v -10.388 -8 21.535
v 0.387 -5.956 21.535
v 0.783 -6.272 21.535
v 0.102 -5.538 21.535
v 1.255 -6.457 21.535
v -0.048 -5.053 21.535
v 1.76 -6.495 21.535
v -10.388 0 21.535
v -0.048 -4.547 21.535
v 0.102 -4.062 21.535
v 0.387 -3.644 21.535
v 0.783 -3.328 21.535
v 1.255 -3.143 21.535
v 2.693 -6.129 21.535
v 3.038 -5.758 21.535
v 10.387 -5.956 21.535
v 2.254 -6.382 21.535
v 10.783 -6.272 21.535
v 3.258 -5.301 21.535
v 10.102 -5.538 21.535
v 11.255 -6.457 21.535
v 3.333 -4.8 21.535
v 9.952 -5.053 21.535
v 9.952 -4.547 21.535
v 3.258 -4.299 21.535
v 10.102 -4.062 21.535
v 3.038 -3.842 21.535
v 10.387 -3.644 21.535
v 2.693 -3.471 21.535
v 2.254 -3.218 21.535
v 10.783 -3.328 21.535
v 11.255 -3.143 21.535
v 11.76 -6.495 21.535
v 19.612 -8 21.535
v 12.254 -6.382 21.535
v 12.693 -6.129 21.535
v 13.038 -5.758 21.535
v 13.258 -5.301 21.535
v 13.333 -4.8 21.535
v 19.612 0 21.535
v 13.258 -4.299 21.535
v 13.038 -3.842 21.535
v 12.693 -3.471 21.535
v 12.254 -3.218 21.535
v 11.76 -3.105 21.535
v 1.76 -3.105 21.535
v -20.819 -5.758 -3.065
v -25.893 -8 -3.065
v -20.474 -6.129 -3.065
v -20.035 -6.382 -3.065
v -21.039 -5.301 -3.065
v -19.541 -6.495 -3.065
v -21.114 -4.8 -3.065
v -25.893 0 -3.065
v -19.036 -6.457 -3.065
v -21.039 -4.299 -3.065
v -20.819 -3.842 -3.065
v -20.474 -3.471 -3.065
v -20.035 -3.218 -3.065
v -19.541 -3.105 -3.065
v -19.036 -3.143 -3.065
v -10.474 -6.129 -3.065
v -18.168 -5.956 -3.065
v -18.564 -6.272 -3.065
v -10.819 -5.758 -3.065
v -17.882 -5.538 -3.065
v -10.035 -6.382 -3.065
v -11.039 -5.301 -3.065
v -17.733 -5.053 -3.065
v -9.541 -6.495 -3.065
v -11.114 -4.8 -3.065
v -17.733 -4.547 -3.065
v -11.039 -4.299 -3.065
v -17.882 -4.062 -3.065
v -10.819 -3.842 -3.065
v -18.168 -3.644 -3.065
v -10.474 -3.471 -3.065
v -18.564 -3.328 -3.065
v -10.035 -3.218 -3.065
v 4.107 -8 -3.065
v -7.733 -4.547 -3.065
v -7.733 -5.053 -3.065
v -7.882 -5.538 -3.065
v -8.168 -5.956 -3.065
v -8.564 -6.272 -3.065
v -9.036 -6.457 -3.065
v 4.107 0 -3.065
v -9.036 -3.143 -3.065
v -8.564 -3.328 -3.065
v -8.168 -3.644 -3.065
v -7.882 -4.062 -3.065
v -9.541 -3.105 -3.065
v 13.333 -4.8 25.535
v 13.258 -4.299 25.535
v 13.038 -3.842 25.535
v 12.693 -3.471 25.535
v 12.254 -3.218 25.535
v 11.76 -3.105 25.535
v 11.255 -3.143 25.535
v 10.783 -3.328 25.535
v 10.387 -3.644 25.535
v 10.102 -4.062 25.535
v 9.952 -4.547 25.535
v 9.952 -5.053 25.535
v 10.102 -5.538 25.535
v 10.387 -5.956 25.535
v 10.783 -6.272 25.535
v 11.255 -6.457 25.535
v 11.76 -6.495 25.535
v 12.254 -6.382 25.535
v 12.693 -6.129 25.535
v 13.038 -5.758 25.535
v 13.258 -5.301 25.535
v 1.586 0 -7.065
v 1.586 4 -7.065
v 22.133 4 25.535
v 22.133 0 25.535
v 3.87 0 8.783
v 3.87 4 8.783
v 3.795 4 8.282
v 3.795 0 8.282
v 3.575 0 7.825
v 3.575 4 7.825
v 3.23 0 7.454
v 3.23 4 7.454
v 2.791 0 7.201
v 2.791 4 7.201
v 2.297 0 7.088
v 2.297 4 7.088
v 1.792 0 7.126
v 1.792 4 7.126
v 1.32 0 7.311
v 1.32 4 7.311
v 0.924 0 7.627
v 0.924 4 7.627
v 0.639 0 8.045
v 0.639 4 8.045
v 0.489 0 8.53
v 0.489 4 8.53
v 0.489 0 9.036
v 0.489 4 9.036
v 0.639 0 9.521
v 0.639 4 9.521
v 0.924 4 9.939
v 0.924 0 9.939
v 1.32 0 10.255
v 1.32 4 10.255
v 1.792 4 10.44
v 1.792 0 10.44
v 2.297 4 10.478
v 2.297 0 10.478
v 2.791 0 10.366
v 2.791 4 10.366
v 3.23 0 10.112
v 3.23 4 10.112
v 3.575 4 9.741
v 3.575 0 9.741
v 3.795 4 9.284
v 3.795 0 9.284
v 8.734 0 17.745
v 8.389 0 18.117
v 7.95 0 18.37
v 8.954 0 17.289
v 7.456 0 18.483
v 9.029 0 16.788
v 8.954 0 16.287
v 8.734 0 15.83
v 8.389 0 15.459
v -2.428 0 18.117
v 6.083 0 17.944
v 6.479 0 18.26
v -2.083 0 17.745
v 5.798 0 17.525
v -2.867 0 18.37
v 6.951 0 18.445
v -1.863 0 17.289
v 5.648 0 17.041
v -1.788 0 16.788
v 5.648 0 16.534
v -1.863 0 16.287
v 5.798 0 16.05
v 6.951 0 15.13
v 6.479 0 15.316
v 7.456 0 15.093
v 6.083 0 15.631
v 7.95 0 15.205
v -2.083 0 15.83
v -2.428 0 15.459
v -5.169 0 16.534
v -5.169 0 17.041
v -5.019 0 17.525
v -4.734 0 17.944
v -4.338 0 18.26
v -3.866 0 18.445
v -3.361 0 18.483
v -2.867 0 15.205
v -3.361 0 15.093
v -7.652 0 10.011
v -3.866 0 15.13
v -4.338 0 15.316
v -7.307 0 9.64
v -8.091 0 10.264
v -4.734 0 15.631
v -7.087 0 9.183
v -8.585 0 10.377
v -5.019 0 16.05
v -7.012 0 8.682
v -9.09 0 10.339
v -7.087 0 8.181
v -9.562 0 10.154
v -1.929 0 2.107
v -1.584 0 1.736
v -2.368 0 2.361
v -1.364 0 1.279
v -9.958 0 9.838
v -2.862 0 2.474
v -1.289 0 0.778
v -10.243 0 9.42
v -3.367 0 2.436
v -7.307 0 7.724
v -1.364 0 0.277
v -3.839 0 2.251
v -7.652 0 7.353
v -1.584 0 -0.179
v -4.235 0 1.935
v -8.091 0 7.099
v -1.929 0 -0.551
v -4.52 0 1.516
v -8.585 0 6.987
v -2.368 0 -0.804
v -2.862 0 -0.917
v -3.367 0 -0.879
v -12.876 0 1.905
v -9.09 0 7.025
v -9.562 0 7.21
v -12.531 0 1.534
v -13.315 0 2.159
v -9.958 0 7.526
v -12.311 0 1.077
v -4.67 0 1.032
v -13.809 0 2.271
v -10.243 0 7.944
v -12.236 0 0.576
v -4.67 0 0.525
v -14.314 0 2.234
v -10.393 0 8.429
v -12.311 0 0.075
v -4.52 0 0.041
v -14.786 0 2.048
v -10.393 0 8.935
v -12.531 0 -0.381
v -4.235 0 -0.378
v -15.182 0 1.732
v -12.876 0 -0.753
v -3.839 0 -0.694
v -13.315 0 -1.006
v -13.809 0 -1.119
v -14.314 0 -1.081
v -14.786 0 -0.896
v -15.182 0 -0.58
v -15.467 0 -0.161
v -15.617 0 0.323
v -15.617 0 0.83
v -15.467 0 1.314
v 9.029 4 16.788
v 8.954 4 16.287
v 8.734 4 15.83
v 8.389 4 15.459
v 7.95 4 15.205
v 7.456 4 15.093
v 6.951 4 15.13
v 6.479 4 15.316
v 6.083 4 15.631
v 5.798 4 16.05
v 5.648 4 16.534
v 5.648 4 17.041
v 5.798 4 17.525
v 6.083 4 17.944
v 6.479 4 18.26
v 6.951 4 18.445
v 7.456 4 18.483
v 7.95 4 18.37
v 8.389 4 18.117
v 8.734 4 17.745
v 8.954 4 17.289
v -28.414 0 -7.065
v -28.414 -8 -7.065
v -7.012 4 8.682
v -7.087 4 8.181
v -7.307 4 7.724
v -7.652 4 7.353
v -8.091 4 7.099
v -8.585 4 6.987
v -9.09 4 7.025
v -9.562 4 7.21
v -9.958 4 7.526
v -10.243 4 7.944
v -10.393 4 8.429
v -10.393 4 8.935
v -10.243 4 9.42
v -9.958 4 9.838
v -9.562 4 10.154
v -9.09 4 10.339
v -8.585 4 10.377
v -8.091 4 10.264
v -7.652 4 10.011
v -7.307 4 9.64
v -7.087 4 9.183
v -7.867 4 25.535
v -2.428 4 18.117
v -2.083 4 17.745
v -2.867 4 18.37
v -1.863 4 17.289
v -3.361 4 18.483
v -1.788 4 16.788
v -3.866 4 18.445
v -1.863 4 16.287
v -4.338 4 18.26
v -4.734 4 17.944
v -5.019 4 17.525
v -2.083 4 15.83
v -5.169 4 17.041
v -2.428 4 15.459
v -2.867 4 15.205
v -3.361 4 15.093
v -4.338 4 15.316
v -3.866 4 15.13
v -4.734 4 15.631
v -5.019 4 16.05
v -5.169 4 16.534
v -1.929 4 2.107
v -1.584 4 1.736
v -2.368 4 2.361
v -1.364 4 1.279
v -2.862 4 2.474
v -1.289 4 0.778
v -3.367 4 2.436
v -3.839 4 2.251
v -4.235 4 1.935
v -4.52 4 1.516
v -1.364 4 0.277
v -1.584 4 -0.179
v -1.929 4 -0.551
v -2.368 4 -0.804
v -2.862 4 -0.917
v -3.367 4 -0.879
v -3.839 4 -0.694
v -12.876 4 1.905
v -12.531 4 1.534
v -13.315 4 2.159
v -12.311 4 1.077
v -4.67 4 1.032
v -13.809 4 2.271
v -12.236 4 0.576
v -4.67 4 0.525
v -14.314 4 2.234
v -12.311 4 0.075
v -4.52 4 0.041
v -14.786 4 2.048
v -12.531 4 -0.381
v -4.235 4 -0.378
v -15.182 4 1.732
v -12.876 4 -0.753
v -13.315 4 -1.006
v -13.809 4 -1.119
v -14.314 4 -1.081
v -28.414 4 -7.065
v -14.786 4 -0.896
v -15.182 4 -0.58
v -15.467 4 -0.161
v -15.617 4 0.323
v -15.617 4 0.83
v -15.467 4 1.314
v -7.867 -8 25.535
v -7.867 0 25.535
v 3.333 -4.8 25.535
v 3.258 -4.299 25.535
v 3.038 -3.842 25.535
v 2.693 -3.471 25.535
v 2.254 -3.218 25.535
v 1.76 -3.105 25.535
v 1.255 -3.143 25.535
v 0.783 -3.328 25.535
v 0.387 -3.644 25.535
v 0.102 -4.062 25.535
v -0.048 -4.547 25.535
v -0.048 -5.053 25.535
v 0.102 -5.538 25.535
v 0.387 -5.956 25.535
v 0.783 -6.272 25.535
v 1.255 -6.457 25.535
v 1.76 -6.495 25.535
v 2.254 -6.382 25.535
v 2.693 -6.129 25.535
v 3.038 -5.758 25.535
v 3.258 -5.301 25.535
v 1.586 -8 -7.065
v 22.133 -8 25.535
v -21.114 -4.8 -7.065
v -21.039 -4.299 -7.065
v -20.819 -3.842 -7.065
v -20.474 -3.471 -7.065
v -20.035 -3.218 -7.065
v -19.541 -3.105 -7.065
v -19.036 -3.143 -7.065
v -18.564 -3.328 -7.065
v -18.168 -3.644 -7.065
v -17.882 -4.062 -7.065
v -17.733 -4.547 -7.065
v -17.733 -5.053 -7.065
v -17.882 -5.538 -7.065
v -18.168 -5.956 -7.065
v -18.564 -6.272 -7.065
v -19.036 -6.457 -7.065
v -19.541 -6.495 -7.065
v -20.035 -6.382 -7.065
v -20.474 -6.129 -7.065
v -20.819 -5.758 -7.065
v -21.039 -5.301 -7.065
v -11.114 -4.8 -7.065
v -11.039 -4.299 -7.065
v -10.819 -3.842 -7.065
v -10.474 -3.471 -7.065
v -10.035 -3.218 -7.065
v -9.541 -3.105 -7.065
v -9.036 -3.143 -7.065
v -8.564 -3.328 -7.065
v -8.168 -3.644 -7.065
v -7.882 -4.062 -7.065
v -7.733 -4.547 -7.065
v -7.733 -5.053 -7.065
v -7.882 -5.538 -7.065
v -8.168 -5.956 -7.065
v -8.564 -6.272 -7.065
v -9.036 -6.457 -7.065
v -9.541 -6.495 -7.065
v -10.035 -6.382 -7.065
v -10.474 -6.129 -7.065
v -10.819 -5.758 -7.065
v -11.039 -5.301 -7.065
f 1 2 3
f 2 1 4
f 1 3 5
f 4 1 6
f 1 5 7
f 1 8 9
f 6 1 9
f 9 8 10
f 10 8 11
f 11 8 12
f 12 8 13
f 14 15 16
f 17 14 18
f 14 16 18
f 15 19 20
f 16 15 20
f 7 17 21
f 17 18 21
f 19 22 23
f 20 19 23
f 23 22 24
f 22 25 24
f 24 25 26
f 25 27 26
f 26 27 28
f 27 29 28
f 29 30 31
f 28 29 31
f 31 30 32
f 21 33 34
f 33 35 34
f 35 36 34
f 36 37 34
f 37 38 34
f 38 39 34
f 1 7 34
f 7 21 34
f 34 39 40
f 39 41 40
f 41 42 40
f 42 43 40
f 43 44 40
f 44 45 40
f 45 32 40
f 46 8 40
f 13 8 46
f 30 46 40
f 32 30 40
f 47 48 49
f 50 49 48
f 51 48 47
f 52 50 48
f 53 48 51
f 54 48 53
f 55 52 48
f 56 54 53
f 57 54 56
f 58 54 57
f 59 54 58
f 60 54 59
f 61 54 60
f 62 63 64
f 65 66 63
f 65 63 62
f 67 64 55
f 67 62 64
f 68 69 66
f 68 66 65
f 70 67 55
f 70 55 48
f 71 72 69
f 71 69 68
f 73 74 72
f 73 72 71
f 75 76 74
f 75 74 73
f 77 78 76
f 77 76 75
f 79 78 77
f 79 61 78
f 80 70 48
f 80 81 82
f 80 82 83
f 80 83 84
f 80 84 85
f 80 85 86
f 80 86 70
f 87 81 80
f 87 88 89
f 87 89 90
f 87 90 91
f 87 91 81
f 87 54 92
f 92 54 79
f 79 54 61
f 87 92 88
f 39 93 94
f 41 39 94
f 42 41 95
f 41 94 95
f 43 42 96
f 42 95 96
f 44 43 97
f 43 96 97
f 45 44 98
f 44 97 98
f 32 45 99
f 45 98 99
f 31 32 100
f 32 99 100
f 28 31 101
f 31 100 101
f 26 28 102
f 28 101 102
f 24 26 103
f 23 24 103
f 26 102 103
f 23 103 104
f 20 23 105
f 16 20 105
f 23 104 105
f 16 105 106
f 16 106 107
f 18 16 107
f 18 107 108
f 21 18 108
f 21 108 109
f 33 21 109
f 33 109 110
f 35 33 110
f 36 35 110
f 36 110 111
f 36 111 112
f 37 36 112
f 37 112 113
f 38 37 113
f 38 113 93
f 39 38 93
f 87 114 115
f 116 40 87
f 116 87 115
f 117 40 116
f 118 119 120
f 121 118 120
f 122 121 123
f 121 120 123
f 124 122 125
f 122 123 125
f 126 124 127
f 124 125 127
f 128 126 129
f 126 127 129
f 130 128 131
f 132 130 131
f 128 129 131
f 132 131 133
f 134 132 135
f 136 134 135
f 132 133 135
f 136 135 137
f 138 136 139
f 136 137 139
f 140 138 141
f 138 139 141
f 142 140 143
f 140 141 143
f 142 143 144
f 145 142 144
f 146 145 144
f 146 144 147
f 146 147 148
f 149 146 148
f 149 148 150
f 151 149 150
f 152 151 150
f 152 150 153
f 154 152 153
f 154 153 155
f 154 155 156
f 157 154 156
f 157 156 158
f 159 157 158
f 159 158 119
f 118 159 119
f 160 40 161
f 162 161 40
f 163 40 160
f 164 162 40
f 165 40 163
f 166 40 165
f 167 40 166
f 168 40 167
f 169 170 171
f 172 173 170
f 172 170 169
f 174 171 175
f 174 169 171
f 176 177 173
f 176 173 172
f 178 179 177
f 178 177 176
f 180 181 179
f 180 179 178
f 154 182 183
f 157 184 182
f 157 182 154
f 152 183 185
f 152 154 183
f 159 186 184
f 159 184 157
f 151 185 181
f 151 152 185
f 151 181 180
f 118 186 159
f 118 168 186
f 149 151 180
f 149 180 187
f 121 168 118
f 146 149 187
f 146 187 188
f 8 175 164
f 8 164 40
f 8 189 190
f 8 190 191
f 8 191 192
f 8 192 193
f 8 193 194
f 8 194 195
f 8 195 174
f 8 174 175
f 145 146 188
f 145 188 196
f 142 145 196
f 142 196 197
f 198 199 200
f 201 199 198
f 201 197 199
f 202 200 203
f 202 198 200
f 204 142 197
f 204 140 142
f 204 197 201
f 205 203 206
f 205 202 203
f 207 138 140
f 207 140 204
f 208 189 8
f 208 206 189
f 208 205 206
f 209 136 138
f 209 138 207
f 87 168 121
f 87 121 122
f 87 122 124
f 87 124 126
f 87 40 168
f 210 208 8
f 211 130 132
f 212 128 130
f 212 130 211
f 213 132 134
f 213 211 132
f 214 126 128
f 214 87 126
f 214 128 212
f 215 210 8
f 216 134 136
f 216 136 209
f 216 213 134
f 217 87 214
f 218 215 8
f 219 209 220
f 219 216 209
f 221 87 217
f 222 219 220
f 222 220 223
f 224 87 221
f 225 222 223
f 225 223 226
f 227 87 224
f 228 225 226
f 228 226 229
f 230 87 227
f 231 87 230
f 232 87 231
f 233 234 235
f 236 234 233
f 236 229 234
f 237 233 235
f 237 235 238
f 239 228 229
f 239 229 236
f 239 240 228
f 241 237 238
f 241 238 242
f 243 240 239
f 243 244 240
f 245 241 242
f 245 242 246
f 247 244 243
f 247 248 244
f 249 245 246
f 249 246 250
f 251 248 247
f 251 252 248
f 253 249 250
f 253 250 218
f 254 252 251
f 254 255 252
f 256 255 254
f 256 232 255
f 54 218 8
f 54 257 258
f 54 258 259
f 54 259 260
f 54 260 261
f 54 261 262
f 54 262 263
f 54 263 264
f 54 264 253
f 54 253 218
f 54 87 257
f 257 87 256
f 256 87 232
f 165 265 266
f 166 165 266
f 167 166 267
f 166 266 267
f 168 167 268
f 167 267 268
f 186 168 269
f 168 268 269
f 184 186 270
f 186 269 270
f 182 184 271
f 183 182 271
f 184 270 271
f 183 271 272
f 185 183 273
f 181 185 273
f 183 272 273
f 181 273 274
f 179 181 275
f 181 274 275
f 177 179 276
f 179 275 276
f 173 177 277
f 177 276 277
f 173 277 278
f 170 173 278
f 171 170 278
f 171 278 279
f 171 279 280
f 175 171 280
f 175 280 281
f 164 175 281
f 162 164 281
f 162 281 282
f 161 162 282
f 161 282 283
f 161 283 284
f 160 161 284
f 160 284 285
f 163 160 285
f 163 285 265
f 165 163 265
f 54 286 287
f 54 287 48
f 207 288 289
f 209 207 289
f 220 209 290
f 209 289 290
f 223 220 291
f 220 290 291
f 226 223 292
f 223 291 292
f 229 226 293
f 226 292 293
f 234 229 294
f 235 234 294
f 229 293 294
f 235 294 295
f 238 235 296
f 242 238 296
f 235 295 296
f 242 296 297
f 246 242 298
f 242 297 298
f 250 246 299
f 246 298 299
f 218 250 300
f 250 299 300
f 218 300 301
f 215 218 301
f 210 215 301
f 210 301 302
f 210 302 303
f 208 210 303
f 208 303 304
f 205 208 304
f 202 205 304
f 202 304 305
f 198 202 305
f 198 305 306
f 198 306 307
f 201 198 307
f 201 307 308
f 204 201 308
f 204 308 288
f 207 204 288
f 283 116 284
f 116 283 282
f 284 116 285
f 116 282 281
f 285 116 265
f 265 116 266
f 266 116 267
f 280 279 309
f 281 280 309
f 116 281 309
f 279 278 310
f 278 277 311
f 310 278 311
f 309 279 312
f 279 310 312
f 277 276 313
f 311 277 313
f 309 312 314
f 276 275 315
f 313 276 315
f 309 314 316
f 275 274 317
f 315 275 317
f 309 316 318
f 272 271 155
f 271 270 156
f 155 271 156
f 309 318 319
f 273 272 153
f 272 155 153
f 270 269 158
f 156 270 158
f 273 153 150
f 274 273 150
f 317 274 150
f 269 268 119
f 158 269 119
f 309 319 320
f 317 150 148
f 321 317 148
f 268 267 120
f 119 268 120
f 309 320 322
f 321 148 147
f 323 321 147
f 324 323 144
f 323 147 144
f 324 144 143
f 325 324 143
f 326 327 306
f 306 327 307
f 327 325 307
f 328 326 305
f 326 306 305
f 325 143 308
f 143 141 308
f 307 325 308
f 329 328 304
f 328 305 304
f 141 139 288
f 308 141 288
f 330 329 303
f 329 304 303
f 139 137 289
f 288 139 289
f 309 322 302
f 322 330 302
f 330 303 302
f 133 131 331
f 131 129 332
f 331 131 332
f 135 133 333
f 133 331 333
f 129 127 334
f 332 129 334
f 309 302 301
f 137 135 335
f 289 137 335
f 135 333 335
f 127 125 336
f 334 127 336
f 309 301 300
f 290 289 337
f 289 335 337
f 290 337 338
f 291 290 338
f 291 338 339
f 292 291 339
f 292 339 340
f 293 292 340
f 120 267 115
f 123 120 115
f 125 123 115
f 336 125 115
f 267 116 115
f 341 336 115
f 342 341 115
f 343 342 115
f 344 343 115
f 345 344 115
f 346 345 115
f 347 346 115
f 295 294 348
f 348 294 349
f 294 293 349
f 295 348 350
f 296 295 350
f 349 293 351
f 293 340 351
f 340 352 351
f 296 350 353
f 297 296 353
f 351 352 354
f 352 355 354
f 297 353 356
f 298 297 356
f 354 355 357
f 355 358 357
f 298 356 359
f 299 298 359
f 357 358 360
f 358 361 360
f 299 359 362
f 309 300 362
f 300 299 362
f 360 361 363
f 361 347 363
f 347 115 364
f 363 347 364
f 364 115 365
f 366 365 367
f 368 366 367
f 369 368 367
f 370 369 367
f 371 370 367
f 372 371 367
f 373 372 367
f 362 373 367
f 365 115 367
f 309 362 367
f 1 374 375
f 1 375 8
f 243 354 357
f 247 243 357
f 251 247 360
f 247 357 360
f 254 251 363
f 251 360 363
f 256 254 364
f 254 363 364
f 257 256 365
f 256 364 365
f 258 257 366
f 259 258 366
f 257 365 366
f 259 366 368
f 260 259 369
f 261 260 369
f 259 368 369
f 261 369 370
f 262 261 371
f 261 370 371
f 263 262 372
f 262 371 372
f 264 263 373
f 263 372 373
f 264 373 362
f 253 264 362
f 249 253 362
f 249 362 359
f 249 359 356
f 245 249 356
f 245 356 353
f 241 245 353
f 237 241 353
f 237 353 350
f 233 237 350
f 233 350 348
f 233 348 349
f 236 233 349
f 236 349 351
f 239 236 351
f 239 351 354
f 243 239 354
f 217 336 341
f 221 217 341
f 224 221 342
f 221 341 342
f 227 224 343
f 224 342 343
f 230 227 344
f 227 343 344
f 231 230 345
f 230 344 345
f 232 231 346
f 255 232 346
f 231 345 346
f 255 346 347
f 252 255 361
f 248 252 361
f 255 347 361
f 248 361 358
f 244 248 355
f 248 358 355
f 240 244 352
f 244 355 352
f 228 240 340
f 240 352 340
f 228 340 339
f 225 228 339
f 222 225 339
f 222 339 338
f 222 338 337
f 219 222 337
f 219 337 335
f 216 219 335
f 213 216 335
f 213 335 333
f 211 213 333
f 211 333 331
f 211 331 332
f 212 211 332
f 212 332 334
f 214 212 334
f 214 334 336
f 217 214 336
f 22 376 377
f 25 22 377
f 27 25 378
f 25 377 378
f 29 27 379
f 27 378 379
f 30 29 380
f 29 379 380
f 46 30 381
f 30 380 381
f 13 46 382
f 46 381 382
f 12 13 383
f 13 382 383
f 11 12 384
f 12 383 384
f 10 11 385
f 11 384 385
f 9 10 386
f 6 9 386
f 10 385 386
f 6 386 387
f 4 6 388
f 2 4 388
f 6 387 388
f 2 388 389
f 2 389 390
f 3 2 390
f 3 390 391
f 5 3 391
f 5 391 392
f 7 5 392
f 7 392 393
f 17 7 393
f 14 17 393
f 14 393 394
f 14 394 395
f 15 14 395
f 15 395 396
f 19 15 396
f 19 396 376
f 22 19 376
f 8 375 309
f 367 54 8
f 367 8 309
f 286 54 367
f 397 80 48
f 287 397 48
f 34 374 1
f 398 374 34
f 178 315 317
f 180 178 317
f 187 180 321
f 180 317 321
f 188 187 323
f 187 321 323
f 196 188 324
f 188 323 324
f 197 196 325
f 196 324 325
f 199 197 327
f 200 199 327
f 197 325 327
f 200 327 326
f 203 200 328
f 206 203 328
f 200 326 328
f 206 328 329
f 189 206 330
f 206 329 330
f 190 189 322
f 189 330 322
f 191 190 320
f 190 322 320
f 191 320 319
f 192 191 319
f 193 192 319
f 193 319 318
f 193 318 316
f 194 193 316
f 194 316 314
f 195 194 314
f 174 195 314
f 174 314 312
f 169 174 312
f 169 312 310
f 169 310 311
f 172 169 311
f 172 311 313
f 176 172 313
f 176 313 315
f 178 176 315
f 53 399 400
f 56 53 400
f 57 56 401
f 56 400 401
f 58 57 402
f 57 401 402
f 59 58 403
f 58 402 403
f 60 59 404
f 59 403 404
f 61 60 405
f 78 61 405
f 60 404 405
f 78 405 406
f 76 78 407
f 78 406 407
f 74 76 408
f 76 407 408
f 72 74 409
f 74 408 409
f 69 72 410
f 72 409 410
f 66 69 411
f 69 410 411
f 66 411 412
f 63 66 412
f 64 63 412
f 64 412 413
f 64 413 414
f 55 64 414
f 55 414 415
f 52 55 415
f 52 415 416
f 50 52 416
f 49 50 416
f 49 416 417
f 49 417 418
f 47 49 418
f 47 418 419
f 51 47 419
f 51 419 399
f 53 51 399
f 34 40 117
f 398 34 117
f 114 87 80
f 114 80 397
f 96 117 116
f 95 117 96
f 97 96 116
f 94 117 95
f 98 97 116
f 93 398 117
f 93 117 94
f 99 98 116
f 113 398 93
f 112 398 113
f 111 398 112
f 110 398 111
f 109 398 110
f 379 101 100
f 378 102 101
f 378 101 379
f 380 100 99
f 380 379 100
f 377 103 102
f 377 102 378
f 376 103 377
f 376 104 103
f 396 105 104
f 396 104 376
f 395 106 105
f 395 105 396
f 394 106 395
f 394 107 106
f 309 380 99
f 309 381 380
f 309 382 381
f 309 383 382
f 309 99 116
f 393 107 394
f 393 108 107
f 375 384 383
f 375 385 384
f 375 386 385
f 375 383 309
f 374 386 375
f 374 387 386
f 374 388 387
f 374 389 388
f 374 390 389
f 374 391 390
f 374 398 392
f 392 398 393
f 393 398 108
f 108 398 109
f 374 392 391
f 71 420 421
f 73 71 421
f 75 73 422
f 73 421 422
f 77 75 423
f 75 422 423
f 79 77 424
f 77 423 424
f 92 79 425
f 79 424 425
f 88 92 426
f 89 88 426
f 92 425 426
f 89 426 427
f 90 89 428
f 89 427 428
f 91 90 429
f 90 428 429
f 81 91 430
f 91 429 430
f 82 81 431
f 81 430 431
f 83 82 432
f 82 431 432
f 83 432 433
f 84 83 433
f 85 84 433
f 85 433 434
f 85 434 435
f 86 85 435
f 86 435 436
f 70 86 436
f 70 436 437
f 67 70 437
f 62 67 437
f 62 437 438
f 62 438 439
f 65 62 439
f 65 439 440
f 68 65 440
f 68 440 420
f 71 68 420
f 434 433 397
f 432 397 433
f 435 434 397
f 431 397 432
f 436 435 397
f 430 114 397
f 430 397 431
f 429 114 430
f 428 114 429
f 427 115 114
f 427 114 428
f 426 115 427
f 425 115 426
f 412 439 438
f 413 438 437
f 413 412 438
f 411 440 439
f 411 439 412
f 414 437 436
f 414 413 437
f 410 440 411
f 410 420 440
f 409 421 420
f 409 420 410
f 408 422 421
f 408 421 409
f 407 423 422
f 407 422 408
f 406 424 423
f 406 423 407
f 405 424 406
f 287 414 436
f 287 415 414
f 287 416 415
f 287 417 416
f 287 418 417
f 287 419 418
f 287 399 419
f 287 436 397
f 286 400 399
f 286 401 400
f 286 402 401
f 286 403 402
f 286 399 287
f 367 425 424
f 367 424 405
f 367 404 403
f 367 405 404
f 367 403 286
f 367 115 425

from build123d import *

# Parameters (mm, degrees)
ESTRUSIONE_ESTRUSIONE1_DEPTH = 4
ESTRUSIONE_ESTRUSIONE2_DEPTH = 8
SCHIZZO7_R                   = 1.7
TAGLIO_ESTRUSIONE4_DEPTH     = 13
SCHIZZO10_R                  = 1.7
TAGLIO_ESTRUSIONE5_DEPTH     = 10
SCHIZZO11_R                  = 1.7
TAGLIO_ESTRUSIONE6_DEPTH     = 10


with BuildPart() as part:
    # Schizzo1 → Estrusione-Estrusione1 (new body)
    with BuildSketch(Plane(origin=(0, 0, 0), x_dir=(1, 0, 0), z_dir=(0, 1, 0))):
        Polygon((1.585961517, 7.064649843), (22.133260635, -25.535350157), (-7.866739365, -25.535350157), (-28.414038483, 7.064649843), align=None)
    extrude(amount=ESTRUSIONE_ESTRUSIONE1_DEPTH)

    # Schizzo4 → Estrusione-Estrusione2 (add)
    with BuildSketch(Plane.XZ):
        Polygon((-28.414038483, -7.064649843), (-25.892897487, -3.064649843), (4.107102513, -3.064649843), (1.585961517, -7.064649843), align=None)
        Polygon((22.133260635, 25.535350157), (-7.866739365, 25.535350157), (-10.387880361, 21.535350157), (19.612119639, 21.535350157), align=None)
    extrude(amount=ESTRUSIONE_ESTRUSIONE2_DEPTH)

    # Schizzo7 → Taglio-Estrusione4 (cut, through all)
    with BuildSketch(Plane(origin=(0, 4, 0), x_dir=(1, 0, 0), z_dir=(0, 1, 0))):
        with Locations((7.329259334, -16.787762722)):
            Circle(SCHIZZO7_R)
        with Locations((-3.487605714, -16.787762722)):
            Circle(SCHIZZO7_R)
        with Locations((-8.711706468, -8.681963492)):
            Circle(SCHIZZO7_R)
        with Locations((-13.935807222, -0.576164263)):
            Circle(SCHIZZO7_R)
        with Locations((-2.9886387, -0.77834524)):
            Circle(SCHIZZO7_R)
        with Locations((2.170310317, -8.783053981)):
            Circle(SCHIZZO7_R)
    extrude(amount=-TAGLIO_ESTRUSIONE4_DEPTH, mode=Mode.SUBTRACT)

    # Schizzo10 → Taglio-Estrusione5 (cut)
    with BuildSketch(Plane.XY.offset(25.535350157)):
        with Locations((1.633260635, -4.8)):
            Circle(SCHIZZO10_R)
        with Locations((11.633260635, -4.8)):
            Circle(SCHIZZO10_R)
    extrude(amount=-TAGLIO_ESTRUSIONE5_DEPTH, mode=Mode.SUBTRACT)

    # Schizzo11 → Taglio-Estrusione6 (cut)
    with BuildSketch(Plane(origin=(0, 0, -7.064649843), x_dir=(-1, 0, 0), z_dir=(0, 0, -1))):
        with Locations((9.414038483, -4.8)):
            Circle(SCHIZZO11_R)
        with Locations((19.414038483, -4.8)):
            Circle(SCHIZZO11_R)
    extrude(amount=-TAGLIO_ESTRUSIONE6_DEPTH, mode=Mode.SUBTRACT)


solid = part.part
